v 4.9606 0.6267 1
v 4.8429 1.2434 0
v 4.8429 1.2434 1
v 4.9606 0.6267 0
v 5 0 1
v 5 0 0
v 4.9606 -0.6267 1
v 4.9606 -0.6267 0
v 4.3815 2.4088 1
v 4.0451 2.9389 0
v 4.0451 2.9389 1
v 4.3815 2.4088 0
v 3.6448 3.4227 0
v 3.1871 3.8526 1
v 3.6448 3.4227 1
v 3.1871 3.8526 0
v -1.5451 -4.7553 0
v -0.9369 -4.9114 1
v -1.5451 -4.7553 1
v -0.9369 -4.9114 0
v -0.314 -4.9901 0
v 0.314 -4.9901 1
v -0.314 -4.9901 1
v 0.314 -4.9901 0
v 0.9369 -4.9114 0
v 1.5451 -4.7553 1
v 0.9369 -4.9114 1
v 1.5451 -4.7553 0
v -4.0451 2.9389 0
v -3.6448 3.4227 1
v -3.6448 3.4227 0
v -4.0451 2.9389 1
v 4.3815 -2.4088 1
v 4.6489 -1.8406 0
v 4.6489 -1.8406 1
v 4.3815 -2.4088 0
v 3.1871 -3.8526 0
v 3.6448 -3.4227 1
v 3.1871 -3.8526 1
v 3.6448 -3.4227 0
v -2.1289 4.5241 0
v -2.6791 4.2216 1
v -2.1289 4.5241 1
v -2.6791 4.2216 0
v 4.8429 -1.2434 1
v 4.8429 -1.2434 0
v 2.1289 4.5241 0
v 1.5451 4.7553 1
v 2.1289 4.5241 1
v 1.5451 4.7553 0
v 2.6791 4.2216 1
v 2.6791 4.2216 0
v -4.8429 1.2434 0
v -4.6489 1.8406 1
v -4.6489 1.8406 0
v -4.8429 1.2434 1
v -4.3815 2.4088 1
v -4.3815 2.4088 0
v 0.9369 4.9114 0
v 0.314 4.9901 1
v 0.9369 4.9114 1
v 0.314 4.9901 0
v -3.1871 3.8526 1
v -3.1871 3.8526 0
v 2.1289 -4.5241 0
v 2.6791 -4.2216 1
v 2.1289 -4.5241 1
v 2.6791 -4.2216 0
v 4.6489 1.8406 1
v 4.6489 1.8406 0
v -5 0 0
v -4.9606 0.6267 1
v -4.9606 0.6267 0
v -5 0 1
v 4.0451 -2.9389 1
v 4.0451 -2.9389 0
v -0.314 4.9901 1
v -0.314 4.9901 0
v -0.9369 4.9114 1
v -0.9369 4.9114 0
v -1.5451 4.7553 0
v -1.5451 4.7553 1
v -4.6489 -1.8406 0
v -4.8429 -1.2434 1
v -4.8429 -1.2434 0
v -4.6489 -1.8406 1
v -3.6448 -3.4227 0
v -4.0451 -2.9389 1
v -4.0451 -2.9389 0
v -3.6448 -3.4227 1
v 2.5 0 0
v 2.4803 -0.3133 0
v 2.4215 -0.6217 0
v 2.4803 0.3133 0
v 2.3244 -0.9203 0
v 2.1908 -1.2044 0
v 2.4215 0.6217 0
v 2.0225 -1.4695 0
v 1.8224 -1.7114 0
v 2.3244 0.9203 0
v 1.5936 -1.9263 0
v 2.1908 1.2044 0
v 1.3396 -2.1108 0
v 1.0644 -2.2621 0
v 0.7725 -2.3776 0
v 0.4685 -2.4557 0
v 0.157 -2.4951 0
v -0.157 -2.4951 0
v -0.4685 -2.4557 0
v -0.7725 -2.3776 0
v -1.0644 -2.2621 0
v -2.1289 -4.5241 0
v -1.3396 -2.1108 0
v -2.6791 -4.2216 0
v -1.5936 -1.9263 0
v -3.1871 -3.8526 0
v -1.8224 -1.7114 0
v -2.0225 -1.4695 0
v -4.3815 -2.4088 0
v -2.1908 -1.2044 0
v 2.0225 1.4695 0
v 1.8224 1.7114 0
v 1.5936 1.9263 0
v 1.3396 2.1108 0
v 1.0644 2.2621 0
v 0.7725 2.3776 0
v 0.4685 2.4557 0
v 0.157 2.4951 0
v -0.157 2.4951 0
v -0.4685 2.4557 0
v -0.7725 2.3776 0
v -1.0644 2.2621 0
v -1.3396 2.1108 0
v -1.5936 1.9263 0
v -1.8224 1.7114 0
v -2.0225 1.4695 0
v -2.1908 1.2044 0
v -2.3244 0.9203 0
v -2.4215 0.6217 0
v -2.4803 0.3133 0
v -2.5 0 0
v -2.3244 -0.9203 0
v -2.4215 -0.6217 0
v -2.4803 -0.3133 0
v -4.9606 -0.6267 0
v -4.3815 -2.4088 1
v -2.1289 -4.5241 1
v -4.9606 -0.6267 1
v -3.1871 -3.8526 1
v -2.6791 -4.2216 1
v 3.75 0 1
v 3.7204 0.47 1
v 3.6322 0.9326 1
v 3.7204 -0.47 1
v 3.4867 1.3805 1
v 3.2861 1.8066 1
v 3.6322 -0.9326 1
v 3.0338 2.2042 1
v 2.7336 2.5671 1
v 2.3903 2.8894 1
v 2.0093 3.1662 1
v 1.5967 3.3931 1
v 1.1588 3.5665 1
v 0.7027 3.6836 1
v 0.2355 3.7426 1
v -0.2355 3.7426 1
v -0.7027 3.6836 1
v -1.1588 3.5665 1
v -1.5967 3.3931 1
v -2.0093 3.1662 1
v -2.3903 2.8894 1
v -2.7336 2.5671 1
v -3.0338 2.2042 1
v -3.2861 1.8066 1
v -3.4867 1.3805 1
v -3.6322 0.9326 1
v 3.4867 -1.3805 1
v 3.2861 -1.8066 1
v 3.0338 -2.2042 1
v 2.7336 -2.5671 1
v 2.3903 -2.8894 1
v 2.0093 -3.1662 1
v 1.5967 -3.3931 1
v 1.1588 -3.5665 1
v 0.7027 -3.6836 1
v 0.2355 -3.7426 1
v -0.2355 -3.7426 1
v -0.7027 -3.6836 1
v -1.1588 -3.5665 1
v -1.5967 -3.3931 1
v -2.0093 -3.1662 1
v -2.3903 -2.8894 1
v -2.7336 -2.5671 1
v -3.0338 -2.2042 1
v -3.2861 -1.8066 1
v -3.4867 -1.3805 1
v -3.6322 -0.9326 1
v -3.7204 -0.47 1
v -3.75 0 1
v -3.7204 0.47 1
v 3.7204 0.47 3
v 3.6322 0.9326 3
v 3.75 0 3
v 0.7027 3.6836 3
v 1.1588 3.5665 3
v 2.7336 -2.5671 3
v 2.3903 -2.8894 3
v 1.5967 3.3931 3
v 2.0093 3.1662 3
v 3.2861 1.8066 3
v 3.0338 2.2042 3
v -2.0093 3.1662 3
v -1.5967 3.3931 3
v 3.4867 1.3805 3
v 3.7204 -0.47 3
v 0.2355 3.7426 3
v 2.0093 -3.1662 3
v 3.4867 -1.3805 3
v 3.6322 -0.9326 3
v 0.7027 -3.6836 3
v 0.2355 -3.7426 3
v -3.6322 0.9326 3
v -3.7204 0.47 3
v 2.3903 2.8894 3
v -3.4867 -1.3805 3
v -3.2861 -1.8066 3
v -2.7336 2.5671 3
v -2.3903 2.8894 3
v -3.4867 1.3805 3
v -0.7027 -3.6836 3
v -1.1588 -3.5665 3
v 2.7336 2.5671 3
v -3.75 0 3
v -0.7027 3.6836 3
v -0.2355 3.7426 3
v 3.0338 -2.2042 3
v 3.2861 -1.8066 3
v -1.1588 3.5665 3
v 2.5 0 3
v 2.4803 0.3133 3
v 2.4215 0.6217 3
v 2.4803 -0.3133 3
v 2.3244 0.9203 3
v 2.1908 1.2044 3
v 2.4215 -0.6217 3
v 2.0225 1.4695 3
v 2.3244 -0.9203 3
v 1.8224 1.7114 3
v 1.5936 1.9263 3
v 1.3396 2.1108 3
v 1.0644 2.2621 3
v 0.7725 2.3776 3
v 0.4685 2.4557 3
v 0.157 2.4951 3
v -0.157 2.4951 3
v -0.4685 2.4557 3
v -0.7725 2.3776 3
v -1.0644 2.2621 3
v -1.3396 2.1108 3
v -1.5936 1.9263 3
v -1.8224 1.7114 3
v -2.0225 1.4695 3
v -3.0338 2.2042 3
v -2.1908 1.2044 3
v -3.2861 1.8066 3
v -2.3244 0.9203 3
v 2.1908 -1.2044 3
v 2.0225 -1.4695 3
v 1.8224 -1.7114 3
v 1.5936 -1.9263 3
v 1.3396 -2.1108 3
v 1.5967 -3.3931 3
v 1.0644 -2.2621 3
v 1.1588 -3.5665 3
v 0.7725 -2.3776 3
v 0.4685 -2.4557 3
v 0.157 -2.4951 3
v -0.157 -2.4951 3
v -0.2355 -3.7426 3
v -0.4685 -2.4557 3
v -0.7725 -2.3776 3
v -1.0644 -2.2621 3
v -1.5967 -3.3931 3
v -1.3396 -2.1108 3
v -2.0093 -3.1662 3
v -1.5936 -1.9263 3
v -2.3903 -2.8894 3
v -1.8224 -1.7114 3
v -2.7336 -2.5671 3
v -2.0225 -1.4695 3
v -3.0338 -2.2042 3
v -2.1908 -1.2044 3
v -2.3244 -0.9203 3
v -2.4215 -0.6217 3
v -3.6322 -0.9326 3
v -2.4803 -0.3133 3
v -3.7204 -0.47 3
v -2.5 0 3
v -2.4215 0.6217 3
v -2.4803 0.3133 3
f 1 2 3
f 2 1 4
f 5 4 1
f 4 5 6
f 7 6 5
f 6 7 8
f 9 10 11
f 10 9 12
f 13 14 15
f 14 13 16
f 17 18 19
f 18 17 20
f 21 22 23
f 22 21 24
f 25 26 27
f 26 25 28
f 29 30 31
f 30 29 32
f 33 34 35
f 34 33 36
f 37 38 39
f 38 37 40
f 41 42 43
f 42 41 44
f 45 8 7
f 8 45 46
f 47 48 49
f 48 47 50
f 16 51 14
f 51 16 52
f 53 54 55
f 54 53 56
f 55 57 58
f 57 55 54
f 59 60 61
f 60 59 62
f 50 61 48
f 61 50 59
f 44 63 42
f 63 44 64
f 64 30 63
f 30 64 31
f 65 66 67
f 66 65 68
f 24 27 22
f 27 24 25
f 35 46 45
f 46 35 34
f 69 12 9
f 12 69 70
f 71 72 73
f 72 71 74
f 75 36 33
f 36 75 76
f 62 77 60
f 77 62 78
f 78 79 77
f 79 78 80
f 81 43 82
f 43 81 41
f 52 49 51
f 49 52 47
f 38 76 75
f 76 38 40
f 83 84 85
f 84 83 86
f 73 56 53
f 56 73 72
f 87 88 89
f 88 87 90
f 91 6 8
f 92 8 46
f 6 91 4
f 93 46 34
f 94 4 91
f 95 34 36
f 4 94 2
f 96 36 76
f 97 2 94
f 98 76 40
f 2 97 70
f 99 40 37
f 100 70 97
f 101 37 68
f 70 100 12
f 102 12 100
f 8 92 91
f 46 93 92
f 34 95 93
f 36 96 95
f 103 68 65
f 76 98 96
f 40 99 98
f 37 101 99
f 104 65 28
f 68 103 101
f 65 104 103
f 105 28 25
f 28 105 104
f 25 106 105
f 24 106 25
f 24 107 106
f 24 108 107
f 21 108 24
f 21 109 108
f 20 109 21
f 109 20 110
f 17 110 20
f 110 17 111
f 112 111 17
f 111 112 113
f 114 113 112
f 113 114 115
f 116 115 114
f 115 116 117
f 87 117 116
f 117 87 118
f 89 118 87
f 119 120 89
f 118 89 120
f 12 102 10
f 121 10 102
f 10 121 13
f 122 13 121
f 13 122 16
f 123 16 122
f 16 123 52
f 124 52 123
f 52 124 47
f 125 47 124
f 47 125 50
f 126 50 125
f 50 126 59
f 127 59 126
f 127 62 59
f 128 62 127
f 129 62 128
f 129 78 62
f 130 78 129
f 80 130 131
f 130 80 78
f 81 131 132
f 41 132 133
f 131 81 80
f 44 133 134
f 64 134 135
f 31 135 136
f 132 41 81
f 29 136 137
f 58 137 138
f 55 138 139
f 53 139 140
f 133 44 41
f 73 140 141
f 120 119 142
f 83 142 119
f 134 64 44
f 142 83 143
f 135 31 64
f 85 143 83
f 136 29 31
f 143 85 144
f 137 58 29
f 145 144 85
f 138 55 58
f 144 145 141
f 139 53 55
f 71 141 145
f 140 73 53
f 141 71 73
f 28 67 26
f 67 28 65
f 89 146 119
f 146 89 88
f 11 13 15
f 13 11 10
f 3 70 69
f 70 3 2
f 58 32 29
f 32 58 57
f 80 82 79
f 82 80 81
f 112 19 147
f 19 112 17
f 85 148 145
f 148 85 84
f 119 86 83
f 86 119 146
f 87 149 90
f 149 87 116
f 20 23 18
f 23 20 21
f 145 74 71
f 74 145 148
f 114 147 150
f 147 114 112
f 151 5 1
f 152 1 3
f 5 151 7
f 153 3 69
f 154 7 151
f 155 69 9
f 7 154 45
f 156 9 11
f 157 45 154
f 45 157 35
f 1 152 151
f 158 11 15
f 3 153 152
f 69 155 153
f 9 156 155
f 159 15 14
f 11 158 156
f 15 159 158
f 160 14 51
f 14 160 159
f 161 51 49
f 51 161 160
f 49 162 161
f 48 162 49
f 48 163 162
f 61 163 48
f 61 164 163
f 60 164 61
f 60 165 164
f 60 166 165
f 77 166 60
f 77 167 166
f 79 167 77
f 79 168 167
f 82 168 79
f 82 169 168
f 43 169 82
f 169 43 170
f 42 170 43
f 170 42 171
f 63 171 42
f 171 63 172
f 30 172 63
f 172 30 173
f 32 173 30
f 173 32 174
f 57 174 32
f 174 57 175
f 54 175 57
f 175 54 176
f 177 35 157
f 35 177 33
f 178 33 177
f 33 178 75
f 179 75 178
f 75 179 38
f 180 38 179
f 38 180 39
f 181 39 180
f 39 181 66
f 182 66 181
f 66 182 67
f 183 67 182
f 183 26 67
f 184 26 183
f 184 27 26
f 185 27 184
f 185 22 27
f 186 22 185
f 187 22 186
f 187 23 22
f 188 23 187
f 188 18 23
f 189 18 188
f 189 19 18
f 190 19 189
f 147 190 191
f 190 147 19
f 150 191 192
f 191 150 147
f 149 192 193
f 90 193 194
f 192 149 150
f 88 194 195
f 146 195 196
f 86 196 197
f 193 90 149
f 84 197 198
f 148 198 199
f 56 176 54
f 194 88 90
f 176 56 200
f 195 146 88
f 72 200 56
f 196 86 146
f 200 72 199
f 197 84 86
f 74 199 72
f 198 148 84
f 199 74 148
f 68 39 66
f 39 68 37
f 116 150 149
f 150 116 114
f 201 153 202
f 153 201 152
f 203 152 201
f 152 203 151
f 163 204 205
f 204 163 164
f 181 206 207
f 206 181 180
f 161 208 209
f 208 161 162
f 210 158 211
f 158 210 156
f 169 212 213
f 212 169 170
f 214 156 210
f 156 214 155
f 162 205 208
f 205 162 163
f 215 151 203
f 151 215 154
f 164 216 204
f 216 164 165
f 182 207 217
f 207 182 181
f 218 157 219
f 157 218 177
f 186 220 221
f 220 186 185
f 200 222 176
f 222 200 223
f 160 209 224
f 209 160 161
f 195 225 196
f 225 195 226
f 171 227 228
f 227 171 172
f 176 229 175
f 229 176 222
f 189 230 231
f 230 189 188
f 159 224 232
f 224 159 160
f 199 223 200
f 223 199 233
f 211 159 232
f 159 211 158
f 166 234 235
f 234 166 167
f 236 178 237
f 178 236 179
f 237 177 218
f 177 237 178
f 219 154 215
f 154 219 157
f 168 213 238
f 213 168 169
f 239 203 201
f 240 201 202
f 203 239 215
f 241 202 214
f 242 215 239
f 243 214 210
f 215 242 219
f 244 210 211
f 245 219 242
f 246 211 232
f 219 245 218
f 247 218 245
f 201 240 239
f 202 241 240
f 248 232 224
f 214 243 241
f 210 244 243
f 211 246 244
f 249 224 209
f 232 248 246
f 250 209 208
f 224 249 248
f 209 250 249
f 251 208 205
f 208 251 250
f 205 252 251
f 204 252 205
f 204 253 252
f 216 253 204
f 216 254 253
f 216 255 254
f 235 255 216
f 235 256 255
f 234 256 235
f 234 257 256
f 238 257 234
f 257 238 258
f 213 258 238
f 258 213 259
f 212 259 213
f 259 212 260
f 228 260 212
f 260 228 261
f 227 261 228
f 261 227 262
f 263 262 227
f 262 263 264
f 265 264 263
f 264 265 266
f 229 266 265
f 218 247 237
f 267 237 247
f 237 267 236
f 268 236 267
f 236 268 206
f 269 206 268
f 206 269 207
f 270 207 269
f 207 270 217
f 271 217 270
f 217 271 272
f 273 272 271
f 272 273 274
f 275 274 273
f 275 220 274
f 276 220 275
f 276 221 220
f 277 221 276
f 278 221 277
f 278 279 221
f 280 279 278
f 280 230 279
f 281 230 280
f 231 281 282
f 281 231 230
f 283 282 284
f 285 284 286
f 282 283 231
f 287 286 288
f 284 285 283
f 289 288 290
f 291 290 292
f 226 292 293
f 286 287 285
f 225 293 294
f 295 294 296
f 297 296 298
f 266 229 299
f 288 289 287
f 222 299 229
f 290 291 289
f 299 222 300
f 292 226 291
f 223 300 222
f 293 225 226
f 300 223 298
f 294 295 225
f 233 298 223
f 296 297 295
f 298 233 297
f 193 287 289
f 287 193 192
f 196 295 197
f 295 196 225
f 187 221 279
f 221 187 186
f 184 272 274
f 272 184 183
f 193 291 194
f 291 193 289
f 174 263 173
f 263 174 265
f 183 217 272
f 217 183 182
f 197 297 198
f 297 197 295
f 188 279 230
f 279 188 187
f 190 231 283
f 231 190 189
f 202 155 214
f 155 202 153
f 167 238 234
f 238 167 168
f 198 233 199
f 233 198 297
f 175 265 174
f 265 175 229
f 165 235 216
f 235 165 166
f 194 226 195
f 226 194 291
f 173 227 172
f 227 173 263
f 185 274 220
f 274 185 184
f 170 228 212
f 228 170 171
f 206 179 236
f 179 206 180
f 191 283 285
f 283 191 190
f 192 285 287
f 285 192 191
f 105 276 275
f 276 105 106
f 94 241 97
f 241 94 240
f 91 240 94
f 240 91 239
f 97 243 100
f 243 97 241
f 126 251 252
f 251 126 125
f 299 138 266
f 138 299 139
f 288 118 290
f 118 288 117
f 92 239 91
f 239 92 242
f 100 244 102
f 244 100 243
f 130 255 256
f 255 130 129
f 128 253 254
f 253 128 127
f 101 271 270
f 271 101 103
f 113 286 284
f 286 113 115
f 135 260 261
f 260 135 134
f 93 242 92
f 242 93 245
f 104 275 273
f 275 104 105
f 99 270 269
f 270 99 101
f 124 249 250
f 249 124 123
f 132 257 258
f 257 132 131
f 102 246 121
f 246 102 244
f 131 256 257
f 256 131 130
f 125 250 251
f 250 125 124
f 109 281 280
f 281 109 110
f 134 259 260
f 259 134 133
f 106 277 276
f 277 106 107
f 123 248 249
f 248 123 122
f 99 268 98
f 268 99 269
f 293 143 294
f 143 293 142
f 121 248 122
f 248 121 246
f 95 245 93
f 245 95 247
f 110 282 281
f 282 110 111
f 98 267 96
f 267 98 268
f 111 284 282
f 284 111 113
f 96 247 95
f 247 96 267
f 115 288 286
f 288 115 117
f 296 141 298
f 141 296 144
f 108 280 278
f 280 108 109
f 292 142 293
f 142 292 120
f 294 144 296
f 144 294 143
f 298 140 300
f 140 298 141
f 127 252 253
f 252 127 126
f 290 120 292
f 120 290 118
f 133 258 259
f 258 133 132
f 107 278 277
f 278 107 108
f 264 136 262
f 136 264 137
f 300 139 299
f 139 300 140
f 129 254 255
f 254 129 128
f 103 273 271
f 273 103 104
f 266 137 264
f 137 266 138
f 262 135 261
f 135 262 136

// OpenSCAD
/*************************************************************************** 
Spring seat to maintain spring alignment and even pressure when compressed.
Author: Mike Thompson (thingyverse: mike_linus)
Date Last Modified: 16/03/2013
Description: change the variable values to print an inside or outside seat of the required dimensions.  The inside seat is more compact for tighter spaces.  The outside version hides the base of the spring for but looks chunkier.
****************************************************************************/

/*globals*/
resolution=50;
bolt_hole_radius=2.5;
seat_radius=5;
support_height=3;
//"inside" or "outside"
seat_type="inside";
thickness=1;

$fn=resolution;

module base(){
	cylinder(r=seat_radius,h=thickness);
	cylinder(r=seat_radius-thickness-0.25,h=support_height);
}

if (seat_type=="inside"){
	difference(){
		base();
		cylinder(r=bolt_hole_radius,h=support_height);
	}
}
else {
	difference(){
		cylinder(r=seat_radius+thickness,h=support_height);
		translate([0,0,thickness])cylinder(r=seat_radius,h=support_height);
		cylinder(r=bolt_hole_radius,h=support_height);
	}
}
